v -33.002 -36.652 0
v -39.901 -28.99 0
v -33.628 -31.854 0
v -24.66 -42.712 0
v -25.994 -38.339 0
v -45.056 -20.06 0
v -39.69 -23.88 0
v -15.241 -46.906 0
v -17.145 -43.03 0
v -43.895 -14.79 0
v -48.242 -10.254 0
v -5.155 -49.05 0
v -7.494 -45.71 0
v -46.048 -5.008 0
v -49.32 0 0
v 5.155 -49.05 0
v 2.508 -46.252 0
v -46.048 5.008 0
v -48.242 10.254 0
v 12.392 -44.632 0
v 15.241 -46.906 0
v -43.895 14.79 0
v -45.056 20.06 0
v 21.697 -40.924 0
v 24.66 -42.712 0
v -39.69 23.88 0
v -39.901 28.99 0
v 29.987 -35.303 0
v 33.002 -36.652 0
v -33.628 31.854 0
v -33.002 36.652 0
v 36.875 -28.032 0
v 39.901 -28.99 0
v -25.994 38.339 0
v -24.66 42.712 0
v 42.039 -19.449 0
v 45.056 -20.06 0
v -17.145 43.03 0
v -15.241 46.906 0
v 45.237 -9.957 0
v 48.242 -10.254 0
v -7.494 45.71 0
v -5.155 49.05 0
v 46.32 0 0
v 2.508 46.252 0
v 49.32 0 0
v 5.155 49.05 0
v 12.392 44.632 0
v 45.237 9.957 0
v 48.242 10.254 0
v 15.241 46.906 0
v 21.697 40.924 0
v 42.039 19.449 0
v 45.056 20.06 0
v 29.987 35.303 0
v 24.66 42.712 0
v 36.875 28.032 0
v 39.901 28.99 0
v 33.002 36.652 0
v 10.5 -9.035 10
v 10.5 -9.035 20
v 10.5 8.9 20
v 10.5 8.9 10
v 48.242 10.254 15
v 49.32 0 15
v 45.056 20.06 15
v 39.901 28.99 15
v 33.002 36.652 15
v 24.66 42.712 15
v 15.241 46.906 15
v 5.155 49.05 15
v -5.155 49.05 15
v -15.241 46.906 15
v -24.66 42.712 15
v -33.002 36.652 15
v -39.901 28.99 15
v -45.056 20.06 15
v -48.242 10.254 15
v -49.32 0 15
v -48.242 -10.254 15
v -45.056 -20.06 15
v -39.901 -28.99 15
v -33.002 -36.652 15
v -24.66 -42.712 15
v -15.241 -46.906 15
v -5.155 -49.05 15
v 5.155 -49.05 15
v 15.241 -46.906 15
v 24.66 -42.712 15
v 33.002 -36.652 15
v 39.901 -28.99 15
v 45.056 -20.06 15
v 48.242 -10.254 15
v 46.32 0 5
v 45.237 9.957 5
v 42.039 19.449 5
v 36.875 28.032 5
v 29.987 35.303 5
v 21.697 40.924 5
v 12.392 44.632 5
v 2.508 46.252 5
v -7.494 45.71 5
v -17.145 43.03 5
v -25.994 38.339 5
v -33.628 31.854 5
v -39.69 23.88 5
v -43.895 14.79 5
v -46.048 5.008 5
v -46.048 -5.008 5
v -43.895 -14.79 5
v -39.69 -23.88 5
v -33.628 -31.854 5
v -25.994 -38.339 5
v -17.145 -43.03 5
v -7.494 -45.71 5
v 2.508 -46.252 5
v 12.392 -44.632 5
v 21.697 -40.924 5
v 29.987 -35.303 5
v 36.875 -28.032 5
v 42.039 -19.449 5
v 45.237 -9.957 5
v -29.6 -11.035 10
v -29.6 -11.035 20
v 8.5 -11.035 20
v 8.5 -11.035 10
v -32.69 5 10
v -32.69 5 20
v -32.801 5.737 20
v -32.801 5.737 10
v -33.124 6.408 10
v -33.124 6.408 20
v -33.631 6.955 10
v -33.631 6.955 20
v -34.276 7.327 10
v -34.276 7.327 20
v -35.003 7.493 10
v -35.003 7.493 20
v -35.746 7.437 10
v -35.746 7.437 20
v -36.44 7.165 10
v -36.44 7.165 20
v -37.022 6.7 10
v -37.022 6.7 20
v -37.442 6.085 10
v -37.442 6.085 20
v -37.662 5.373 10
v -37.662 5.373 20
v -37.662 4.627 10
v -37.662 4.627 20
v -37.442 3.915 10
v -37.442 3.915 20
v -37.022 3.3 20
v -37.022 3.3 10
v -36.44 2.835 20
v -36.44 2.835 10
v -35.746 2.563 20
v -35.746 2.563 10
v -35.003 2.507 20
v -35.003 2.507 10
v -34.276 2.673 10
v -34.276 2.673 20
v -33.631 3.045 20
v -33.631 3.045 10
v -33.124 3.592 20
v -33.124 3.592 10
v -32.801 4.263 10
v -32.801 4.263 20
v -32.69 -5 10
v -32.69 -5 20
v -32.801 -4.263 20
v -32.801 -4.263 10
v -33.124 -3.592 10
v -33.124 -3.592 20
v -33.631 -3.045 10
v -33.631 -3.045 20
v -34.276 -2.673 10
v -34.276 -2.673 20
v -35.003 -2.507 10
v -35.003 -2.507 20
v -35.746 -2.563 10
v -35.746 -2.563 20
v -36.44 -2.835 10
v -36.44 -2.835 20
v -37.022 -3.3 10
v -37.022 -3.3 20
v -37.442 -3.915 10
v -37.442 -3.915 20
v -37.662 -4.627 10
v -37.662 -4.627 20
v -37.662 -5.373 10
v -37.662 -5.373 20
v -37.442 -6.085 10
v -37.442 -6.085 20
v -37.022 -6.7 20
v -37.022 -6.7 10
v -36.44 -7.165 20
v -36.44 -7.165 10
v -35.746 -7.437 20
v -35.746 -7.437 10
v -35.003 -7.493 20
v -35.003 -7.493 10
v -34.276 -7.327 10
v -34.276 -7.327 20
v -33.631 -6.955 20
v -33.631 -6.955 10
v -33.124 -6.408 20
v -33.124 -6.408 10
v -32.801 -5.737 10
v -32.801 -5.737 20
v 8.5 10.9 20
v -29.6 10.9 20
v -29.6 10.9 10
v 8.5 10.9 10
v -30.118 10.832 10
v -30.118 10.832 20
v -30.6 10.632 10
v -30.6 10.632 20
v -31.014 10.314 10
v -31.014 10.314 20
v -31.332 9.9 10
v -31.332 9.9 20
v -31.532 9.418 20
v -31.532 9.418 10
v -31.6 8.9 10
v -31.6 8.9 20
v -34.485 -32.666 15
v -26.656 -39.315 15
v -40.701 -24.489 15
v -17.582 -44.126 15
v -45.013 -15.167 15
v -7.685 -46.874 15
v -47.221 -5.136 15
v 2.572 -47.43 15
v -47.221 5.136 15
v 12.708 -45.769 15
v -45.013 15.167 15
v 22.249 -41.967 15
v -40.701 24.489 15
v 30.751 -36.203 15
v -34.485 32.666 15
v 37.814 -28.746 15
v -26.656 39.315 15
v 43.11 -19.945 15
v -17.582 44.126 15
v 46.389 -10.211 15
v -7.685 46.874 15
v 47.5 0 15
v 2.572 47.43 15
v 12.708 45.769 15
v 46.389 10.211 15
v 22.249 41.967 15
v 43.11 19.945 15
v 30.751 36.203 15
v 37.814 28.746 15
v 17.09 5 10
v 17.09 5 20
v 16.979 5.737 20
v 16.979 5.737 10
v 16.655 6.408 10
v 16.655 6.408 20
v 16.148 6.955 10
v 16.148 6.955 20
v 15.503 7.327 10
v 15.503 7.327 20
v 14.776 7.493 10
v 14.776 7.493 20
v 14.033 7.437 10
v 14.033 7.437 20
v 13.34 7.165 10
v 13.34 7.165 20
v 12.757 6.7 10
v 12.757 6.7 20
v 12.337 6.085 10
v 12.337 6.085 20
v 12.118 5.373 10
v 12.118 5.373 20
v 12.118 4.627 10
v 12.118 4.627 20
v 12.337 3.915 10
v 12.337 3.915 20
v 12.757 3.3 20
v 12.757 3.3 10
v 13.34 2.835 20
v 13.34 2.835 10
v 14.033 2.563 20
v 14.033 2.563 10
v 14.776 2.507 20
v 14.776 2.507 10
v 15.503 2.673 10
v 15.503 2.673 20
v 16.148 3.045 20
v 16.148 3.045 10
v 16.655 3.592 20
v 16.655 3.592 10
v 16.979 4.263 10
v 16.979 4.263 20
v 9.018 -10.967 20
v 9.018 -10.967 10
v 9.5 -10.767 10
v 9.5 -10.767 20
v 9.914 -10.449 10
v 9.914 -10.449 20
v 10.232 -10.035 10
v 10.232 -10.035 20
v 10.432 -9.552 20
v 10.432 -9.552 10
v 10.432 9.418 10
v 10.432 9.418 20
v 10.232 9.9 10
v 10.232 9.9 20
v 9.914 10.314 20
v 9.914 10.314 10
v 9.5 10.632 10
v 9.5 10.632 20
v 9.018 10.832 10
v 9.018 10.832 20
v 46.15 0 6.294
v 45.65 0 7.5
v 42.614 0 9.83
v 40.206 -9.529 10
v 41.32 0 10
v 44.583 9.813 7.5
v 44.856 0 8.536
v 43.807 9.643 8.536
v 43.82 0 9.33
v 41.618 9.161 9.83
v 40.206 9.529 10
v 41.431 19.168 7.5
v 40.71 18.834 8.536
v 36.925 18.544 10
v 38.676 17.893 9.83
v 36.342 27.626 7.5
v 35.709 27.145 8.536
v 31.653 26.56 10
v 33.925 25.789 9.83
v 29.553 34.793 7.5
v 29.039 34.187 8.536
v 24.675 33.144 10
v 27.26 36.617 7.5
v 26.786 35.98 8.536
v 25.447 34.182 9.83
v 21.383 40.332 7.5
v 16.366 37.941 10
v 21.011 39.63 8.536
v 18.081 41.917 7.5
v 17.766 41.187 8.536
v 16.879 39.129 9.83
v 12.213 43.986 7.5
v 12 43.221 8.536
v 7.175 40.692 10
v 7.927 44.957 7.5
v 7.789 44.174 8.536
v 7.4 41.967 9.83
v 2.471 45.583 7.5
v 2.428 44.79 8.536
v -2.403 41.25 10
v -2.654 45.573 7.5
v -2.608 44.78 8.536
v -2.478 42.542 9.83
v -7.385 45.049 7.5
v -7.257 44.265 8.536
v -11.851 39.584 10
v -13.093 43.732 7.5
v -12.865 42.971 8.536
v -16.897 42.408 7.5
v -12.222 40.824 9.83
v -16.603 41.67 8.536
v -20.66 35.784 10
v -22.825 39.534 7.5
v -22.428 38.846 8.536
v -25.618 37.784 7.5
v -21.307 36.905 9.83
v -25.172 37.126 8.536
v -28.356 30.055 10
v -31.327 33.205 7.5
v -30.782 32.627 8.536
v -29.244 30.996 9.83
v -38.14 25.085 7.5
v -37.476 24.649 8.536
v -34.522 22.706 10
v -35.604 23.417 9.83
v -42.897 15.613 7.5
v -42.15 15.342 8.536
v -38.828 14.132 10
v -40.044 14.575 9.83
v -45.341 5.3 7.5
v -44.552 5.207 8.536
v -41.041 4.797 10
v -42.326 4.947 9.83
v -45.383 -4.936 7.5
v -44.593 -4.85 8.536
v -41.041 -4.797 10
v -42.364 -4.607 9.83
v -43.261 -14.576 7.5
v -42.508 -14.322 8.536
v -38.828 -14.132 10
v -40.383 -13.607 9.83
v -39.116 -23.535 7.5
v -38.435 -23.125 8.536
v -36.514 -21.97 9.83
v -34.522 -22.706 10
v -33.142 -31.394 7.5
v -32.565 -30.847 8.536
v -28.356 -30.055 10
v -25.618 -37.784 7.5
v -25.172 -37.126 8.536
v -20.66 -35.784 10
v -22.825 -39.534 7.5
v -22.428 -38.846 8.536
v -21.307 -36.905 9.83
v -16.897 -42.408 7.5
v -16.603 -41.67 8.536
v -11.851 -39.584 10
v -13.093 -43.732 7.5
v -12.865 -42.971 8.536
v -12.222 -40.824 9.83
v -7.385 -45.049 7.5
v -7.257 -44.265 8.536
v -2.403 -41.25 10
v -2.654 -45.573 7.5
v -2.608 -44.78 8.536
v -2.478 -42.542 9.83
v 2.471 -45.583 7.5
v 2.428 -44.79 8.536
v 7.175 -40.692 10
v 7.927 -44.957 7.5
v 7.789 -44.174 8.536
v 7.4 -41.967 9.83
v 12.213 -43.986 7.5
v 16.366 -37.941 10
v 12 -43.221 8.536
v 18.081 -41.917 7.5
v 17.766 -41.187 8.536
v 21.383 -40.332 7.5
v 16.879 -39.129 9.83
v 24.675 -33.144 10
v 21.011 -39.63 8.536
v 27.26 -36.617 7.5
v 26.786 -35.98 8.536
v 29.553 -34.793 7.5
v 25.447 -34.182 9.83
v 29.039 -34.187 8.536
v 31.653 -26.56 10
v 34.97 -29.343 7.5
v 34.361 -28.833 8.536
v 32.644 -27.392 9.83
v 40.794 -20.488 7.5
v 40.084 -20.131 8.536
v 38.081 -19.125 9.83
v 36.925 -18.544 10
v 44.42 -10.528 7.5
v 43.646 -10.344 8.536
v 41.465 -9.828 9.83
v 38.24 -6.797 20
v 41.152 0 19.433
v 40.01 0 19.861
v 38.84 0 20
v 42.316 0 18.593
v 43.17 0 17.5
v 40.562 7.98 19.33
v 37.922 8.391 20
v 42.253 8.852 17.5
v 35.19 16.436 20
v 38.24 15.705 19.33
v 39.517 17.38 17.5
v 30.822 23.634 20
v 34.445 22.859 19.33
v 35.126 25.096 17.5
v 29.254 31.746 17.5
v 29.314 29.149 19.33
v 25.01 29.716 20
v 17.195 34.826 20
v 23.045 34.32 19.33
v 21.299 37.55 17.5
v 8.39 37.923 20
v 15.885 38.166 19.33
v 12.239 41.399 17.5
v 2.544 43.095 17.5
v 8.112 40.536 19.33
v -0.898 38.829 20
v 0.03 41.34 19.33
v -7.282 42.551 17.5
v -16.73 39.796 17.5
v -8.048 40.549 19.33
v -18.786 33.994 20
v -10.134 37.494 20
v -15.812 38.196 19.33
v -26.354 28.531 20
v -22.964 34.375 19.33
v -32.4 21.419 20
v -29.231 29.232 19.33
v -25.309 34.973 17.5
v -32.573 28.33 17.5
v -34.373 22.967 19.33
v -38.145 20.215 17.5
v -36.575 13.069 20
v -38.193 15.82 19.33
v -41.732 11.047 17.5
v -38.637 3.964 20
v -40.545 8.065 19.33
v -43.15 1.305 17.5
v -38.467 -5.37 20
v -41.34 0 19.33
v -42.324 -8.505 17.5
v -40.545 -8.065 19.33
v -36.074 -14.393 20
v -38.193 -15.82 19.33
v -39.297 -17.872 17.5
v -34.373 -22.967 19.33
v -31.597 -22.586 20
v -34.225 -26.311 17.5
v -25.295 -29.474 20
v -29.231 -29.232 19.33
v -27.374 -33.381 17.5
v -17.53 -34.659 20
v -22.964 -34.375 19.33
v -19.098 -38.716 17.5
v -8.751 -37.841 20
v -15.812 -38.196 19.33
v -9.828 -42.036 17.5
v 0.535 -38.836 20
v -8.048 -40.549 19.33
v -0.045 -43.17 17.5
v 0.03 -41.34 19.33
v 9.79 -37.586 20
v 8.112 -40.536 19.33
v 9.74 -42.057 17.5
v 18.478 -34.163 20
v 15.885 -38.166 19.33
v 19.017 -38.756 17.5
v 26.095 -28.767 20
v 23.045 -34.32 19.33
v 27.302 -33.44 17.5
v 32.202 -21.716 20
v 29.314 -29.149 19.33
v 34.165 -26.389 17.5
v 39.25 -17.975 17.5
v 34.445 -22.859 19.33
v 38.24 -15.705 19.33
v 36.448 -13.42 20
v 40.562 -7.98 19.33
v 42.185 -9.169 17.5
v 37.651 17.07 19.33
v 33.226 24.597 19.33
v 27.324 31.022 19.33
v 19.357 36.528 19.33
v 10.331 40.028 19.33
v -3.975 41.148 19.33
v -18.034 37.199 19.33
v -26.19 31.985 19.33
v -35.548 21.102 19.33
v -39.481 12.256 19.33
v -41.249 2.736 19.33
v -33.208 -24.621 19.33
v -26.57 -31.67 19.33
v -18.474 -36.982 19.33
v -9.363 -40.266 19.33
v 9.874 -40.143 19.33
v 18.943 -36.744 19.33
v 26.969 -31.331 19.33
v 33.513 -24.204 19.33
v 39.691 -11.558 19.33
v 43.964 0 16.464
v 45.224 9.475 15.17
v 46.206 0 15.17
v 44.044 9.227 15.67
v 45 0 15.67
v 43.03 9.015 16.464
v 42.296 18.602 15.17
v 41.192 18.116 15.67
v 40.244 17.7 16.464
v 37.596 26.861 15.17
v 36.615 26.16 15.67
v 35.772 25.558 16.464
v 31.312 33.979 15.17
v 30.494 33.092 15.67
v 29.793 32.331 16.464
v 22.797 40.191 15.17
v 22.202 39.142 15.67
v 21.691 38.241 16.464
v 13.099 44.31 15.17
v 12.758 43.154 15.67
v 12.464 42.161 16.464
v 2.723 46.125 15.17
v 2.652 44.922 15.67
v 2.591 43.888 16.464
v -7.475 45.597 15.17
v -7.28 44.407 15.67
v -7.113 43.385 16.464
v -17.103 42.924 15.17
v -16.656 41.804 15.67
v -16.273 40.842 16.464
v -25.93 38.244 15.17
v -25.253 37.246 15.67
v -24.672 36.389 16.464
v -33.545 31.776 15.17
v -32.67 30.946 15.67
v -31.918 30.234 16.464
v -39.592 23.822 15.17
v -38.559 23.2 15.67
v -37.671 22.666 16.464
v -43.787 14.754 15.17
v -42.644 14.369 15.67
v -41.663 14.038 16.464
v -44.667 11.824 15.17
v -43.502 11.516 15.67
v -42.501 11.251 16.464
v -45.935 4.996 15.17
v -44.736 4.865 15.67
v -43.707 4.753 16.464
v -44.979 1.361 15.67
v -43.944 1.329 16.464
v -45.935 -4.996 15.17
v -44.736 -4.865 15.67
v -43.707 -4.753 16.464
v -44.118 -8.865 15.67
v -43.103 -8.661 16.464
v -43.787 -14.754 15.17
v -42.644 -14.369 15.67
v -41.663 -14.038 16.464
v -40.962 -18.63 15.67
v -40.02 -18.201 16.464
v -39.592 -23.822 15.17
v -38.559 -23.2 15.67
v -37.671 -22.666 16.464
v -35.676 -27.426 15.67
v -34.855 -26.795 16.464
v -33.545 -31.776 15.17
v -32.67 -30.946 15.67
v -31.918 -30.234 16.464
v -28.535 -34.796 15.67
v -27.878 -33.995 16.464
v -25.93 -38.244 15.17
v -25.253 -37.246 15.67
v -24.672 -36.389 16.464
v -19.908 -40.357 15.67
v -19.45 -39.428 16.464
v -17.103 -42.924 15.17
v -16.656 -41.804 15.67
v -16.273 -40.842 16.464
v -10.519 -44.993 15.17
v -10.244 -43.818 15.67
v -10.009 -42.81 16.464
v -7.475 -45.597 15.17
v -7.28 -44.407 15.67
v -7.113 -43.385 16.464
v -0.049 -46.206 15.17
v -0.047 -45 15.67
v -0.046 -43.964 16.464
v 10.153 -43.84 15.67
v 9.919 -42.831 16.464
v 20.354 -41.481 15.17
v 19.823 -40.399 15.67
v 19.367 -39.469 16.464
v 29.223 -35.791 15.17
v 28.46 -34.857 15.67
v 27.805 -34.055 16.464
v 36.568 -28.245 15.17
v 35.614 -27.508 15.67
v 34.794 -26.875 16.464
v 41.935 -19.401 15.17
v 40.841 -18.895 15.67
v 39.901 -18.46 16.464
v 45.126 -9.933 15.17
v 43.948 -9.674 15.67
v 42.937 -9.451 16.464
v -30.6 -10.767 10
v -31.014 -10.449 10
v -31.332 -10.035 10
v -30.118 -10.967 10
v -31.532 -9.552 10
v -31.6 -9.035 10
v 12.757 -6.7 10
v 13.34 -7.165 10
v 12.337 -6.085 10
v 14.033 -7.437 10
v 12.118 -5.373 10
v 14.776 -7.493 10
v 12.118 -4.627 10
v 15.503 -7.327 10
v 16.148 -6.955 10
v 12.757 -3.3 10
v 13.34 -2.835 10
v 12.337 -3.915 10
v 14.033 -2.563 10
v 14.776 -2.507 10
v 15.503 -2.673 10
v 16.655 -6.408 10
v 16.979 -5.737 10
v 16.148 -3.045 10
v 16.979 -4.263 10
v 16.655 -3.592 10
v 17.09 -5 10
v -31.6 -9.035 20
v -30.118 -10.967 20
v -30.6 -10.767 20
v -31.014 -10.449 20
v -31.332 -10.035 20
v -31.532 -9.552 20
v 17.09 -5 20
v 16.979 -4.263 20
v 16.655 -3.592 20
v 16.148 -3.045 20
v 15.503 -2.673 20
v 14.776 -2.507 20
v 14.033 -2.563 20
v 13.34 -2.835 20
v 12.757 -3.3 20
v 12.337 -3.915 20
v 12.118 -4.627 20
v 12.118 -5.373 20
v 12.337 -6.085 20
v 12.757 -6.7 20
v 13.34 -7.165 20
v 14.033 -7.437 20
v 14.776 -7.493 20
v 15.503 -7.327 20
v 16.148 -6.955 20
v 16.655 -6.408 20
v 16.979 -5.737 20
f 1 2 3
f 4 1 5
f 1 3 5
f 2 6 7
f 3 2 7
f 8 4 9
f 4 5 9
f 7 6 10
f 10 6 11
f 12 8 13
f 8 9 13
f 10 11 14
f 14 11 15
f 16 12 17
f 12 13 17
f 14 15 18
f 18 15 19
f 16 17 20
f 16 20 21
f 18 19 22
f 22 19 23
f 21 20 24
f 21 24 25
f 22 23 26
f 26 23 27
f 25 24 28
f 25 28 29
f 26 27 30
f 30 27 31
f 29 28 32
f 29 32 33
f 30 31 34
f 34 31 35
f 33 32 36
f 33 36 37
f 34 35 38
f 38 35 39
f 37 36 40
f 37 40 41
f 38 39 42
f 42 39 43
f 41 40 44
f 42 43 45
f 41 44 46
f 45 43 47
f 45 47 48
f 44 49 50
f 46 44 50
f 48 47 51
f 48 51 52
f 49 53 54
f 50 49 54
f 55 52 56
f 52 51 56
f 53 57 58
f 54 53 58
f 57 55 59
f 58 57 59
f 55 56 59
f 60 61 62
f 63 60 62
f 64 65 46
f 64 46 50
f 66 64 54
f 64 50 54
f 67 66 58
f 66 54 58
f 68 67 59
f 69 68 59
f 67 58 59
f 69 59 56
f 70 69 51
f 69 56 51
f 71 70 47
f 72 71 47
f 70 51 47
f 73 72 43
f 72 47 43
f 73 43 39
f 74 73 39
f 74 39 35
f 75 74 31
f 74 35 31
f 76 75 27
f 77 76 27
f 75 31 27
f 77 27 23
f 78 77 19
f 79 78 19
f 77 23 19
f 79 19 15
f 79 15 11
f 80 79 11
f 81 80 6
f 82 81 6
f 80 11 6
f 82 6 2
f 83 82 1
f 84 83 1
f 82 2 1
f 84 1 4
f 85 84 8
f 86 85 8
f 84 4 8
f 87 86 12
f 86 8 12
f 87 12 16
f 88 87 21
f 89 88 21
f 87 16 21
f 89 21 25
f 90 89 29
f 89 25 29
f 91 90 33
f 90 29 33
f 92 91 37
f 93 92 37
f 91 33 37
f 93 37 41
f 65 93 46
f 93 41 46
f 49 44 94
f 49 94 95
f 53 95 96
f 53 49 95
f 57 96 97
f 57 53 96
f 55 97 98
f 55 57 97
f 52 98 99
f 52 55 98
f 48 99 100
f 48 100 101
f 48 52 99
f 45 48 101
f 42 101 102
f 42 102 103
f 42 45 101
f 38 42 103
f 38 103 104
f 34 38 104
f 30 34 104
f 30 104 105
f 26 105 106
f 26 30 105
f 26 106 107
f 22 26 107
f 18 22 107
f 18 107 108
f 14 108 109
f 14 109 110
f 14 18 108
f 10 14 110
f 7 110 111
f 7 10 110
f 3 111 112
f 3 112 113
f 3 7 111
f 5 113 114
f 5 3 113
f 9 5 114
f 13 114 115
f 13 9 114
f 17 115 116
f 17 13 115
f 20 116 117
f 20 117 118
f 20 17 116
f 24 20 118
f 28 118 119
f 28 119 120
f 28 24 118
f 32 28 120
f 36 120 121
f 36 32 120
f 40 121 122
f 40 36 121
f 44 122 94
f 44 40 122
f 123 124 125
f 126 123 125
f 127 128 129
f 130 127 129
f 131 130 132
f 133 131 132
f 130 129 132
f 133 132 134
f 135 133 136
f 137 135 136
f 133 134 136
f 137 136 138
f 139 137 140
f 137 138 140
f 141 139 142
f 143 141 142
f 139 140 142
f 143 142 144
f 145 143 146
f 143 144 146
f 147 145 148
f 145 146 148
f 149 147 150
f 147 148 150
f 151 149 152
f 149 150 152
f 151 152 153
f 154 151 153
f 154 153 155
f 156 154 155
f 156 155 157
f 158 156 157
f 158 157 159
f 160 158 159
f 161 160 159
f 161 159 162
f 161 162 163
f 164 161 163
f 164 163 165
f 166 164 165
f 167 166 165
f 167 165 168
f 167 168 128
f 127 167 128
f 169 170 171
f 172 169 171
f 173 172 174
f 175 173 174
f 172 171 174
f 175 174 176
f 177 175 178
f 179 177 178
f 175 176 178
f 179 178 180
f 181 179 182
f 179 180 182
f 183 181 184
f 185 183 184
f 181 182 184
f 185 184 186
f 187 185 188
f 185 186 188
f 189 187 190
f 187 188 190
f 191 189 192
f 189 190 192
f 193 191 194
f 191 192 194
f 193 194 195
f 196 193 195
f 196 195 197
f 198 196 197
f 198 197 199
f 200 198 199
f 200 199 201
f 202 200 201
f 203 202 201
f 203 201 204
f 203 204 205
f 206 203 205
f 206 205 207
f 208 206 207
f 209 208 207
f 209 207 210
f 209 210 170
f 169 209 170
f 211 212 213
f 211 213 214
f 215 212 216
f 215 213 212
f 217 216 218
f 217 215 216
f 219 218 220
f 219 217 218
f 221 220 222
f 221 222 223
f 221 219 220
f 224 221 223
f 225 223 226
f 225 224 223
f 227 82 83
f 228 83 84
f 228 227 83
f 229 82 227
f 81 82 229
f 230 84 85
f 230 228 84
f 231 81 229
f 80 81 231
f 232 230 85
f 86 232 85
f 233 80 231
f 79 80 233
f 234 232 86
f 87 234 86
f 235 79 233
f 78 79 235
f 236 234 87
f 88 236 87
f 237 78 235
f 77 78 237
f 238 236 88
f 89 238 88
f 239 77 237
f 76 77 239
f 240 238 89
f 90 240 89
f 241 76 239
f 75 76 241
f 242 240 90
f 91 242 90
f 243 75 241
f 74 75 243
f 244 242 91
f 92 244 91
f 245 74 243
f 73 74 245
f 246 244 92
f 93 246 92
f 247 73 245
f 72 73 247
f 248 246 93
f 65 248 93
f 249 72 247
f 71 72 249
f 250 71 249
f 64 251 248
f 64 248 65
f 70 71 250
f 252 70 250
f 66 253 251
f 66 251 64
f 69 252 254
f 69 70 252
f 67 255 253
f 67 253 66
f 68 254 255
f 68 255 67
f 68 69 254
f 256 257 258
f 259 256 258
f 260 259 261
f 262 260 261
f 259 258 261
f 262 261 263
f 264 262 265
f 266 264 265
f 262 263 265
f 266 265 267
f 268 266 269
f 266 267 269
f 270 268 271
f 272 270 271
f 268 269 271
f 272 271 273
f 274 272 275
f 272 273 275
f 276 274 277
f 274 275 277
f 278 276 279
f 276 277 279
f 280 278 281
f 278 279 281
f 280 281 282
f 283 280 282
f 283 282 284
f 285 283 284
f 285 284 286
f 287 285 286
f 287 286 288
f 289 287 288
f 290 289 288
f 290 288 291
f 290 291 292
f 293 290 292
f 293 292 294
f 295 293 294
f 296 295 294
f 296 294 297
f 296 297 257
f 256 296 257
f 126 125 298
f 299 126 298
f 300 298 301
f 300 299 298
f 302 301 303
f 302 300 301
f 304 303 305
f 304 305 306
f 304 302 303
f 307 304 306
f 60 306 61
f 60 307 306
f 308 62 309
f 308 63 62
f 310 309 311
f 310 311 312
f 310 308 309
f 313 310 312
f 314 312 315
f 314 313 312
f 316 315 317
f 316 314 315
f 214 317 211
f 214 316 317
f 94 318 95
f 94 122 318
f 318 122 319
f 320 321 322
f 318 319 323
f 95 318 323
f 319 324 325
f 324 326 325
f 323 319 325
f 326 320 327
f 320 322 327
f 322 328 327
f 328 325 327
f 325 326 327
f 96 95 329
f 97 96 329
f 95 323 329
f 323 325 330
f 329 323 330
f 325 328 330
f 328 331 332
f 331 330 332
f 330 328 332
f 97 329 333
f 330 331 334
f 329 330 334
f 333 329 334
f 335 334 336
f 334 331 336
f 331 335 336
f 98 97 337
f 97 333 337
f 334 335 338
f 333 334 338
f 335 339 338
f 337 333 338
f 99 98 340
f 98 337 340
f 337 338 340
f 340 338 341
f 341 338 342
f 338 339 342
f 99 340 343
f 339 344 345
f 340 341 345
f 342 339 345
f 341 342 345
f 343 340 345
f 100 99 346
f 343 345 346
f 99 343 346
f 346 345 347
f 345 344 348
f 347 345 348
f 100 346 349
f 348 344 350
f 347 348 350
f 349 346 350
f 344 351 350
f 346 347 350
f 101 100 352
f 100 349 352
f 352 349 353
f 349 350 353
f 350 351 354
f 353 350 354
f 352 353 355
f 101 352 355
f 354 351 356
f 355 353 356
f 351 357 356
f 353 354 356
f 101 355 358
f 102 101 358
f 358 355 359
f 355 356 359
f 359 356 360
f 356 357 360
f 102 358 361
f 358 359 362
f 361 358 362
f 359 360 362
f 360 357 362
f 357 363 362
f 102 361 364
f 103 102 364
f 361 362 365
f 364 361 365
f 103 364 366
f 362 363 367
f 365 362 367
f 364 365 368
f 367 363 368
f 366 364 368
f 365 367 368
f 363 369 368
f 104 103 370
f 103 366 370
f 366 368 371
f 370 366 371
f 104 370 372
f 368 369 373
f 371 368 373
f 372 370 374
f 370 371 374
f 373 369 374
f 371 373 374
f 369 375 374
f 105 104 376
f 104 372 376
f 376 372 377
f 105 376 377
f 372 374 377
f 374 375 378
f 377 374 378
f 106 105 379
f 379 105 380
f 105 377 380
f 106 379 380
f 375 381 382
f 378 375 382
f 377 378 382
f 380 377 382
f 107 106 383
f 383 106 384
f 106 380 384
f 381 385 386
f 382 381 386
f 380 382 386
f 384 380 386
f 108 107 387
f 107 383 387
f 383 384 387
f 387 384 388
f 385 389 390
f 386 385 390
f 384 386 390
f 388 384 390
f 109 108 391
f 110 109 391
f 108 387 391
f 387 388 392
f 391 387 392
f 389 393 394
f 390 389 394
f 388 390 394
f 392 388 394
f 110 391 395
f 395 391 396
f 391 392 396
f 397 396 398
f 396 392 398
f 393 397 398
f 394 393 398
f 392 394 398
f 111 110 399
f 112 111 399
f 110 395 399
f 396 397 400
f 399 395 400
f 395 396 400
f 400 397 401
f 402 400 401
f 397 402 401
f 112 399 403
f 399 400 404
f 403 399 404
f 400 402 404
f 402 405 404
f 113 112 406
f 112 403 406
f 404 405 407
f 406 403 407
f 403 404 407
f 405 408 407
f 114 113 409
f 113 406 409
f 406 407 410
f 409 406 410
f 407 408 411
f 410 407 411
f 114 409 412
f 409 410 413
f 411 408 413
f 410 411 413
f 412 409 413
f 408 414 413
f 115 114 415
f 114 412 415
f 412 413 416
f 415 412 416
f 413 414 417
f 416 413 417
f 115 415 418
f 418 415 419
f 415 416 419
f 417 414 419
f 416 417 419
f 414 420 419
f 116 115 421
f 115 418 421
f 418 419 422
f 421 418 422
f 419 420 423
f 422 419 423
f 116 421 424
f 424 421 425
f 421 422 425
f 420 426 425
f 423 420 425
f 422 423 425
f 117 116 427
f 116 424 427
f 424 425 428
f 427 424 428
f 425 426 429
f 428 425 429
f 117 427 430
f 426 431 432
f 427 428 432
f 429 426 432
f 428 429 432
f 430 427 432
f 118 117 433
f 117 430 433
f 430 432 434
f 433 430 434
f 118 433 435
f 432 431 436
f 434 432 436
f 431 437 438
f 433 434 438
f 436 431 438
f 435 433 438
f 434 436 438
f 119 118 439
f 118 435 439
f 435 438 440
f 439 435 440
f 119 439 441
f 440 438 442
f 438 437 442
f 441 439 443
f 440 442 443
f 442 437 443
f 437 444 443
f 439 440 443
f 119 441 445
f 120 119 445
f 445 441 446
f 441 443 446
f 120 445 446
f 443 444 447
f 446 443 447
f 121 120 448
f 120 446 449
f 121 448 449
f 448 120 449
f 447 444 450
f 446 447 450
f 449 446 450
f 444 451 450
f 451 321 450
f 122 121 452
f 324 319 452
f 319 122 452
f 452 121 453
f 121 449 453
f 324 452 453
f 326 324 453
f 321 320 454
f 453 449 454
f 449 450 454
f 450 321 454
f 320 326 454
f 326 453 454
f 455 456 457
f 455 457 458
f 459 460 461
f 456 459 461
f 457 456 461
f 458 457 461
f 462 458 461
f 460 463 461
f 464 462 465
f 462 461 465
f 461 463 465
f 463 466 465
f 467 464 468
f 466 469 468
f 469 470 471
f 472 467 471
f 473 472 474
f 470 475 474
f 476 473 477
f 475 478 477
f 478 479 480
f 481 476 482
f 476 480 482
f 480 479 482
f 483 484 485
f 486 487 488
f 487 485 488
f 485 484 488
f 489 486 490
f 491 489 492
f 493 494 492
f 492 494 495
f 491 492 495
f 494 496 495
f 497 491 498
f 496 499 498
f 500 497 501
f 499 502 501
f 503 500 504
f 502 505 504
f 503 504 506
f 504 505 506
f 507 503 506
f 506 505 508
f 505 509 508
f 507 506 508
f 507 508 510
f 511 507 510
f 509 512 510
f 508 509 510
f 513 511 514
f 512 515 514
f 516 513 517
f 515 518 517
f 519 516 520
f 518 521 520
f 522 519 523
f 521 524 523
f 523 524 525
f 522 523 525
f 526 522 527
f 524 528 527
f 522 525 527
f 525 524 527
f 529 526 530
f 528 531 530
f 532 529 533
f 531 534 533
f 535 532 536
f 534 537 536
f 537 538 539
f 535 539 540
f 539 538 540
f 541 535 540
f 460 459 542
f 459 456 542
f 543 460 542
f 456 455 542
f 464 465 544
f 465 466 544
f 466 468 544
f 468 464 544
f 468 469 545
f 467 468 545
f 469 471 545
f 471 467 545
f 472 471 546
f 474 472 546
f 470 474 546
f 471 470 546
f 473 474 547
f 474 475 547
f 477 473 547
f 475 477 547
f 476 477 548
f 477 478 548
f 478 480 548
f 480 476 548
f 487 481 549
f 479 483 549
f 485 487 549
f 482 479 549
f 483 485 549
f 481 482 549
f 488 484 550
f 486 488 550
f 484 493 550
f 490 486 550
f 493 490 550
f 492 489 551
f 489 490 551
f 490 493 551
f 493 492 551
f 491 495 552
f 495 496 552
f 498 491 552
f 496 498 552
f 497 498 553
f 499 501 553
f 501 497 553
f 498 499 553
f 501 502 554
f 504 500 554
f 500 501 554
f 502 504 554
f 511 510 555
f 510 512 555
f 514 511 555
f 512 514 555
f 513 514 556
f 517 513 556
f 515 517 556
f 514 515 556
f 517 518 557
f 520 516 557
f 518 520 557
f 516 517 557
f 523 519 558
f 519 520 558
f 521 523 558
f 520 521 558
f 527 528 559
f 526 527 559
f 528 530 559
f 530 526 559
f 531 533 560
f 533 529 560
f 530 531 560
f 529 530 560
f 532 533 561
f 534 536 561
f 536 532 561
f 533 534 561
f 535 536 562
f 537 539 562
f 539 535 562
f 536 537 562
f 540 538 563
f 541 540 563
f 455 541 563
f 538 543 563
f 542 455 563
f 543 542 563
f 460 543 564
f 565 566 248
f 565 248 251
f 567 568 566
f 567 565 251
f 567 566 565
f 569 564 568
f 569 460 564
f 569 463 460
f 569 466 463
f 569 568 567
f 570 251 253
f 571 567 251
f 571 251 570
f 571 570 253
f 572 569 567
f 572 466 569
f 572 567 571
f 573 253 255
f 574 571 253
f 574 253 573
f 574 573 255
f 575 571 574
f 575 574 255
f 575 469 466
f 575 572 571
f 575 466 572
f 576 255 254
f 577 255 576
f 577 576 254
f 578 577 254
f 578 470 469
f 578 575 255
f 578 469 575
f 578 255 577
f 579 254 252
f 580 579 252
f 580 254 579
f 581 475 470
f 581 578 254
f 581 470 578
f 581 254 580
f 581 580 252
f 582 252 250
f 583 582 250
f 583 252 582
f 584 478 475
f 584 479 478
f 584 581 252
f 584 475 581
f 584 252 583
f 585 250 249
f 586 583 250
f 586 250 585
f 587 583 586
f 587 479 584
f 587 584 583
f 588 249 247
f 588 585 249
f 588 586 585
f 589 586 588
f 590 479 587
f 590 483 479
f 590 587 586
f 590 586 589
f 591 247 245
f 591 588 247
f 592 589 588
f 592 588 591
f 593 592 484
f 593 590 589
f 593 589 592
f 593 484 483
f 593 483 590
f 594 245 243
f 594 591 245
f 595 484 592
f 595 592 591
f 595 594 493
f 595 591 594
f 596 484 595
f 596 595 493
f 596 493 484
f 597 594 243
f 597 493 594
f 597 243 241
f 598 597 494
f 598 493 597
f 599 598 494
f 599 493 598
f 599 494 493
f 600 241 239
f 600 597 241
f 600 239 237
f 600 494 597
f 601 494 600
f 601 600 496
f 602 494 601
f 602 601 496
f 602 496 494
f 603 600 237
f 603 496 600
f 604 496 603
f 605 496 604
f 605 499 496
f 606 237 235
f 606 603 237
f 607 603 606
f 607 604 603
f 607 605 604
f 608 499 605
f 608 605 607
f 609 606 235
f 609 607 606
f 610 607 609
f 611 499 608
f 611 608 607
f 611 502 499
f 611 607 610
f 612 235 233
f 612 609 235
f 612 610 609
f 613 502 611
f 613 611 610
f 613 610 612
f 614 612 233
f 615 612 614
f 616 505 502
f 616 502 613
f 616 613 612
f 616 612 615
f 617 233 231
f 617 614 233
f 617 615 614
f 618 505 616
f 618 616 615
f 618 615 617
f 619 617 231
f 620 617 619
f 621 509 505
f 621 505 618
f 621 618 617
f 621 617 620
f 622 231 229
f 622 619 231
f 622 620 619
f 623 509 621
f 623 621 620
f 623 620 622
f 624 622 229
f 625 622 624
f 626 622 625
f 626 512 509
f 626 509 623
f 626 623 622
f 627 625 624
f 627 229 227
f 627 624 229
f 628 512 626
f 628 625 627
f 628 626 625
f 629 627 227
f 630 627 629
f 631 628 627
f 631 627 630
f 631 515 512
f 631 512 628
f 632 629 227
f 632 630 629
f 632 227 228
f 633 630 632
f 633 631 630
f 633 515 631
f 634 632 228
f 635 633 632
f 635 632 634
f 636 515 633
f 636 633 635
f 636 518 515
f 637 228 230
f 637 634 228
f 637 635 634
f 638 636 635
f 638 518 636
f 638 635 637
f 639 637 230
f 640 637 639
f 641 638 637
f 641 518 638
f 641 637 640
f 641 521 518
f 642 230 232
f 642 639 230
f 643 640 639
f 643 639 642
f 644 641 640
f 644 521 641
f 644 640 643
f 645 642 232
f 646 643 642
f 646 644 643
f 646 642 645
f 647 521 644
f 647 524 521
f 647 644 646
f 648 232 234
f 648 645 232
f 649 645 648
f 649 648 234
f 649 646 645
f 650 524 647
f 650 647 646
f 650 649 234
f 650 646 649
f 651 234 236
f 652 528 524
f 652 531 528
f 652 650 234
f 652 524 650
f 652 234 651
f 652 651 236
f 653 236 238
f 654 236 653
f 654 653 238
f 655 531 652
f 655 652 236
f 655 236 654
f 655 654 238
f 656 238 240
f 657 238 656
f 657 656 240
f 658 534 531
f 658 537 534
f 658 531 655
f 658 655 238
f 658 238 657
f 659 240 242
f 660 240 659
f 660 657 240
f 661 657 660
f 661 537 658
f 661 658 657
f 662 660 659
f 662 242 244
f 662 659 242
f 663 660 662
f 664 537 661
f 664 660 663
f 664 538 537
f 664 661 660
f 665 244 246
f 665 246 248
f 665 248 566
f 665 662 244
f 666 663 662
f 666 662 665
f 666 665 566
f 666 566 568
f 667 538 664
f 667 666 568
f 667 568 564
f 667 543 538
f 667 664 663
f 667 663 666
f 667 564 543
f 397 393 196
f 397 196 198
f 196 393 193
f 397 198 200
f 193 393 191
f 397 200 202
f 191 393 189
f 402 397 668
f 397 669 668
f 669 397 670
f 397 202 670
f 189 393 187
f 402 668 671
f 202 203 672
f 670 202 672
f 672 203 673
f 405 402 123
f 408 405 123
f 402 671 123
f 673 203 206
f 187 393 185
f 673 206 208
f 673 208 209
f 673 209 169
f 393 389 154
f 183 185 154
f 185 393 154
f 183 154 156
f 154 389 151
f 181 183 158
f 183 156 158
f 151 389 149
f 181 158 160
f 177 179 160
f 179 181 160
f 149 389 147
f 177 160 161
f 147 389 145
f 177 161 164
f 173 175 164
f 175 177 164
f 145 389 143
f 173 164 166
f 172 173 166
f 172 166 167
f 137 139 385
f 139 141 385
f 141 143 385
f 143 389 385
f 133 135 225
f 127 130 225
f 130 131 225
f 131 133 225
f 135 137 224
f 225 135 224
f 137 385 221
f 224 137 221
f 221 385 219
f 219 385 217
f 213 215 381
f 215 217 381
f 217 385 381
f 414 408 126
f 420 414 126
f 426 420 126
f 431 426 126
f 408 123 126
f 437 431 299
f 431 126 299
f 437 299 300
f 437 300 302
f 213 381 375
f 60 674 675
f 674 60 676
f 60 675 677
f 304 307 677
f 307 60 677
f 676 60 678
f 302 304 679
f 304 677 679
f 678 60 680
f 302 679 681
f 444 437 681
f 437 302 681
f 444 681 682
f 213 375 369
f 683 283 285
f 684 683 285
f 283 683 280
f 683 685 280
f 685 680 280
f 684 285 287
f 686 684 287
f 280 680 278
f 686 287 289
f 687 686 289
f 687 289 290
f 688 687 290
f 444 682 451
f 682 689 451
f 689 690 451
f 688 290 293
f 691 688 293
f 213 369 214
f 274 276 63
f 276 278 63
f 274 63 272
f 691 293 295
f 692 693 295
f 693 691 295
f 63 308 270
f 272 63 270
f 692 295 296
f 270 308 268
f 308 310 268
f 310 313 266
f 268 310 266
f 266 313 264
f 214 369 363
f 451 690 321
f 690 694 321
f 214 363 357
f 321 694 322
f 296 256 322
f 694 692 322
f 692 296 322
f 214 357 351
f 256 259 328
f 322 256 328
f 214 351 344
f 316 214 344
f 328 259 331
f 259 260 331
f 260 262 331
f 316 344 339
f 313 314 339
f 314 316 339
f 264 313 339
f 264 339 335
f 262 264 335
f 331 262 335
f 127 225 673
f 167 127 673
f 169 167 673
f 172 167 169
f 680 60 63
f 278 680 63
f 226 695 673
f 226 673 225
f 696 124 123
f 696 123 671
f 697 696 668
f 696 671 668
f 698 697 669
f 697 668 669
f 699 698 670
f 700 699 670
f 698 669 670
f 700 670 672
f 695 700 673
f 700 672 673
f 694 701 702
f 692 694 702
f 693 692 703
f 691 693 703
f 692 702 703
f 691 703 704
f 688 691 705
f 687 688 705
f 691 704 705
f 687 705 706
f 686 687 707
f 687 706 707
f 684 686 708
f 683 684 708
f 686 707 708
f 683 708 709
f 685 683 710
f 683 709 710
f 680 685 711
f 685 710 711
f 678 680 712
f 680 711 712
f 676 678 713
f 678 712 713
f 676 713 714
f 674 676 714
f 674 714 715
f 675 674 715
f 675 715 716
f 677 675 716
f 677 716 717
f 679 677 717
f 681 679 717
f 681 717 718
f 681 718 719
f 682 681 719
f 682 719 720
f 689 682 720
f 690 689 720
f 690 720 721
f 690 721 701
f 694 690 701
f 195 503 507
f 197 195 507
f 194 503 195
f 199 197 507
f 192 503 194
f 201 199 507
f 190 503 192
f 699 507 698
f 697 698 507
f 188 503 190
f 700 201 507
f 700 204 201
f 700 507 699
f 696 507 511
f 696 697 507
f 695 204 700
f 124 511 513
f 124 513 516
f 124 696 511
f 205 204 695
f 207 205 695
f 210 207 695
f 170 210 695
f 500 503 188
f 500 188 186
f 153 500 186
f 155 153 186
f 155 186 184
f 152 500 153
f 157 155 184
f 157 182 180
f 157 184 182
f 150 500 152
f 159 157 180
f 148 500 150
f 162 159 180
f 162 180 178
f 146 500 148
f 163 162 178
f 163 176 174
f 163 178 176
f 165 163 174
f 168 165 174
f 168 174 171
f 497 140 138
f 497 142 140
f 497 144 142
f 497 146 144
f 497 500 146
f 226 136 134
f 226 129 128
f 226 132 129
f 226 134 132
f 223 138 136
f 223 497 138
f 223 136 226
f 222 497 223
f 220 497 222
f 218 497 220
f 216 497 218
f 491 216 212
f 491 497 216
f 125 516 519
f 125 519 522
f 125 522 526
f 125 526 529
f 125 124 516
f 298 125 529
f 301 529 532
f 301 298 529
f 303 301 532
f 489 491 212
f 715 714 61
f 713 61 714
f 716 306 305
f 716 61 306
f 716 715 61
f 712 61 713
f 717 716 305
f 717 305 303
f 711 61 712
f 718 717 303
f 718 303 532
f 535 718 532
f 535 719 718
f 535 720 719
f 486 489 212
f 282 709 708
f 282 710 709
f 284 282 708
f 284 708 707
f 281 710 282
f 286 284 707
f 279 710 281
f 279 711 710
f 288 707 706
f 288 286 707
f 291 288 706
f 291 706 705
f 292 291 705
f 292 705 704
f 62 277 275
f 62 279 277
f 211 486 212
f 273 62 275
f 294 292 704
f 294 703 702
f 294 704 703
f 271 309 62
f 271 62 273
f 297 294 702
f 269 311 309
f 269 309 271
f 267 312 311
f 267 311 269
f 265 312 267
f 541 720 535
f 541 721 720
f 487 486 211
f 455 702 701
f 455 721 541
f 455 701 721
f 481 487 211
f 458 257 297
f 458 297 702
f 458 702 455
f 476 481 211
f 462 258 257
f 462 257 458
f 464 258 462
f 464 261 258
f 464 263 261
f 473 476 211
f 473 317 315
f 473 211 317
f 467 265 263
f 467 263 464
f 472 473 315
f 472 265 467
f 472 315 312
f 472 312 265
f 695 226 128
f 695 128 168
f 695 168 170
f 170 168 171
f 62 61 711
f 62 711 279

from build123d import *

# Parameters (mm, degrees)
SKETCH1_R           = 49.32
SKETCH1_R_2         = 46.32
EXTRUDE_THIN1_DEPTH = 10
SKETCH2_R           = 49.32
BOSS_EXTRUDE1_DEPTH = 5
SKETCH3_R           = 42.5
BOSS_EXTRUDE2_DEPTH = 5
FILLET1_R           = 5
FILLET2_R           = 5
SKETCH4_R           = 2.5
SKETCH4_W           = 42.1
SKETCH4_H           = 21.934824781
CUT_EXTRUDE1_DEPTH  = 73.559801543
FILLET3_R           = 2


with BuildPart() as part:
    # Sketch1 → Extrude-Thin1 (new body)
    with BuildSketch(Plane.XY):
        Circle(SKETCH1_R)
        Circle(SKETCH1_R_2, mode=Mode.SUBTRACT)
    extrude(amount=EXTRUDE_THIN1_DEPTH)

    # Sketch2 → Boss-Extrude1 (add)
    with BuildSketch(Plane.XY.offset(10)):
        Circle(SKETCH2_R)
    extrude(amount=BOSS_EXTRUDE1_DEPTH)

    # Sketch3 → Boss-Extrude2 (add)
    with BuildSketch(Plane.XY.offset(15)):
        Circle(SKETCH3_R)
    extrude(amount=BOSS_EXTRUDE2_DEPTH)

    # Fillet1
    fillet1_edges = [part.edges().sort_by_distance(p)[0] for p in [
        (-42.5, 0, 15),
        (-46.32, 0, 10),
    ]]
    fillet(fillet1_edges, radius=FILLET1_R - 0.0001)  # a hair under: the kernel refuses the full size

    # Fillet2
    fillet2_edges = [part.edges().sort_by_distance(p)[0] for p in [
        (-42.5, 0, 20),
    ]]
    fillet(fillet2_edges, radius=FILLET2_R)

    # Sketch4 → Cut-Extrude1 (cut, through all)
    with BuildSketch(Plane.XY.offset(20)):
        with Locations((-35.189613301, 5)):
            Circle(SKETCH4_R)
        with Locations((-35.189613301, -5)):
            Circle(SKETCH4_R)
        with Locations((14.589613301, 5)):
            Circle(SKETCH4_R)
        with Locations((14.589613301, -5)):
            Circle(SKETCH4_R)
        with Locations((-10.55, -0.067412391)):
            Rectangle(SKETCH4_W, SKETCH4_H)
    extrude(amount=-CUT_EXTRUDE1_DEPTH, mode=Mode.SUBTRACT)

    # Fillet3
    fillet3_edges = [part.edges().sort_by_distance(p)[0] for p in [
        (10.5, 10.9, 15),
        (10.5, -11.034824781, 15),
        (-31.6, -11.034824781, 15),
        (-31.6, 10.9, 15),
    ]]
    fillet(fillet3_edges, radius=FILLET3_R)


solid = part.part
